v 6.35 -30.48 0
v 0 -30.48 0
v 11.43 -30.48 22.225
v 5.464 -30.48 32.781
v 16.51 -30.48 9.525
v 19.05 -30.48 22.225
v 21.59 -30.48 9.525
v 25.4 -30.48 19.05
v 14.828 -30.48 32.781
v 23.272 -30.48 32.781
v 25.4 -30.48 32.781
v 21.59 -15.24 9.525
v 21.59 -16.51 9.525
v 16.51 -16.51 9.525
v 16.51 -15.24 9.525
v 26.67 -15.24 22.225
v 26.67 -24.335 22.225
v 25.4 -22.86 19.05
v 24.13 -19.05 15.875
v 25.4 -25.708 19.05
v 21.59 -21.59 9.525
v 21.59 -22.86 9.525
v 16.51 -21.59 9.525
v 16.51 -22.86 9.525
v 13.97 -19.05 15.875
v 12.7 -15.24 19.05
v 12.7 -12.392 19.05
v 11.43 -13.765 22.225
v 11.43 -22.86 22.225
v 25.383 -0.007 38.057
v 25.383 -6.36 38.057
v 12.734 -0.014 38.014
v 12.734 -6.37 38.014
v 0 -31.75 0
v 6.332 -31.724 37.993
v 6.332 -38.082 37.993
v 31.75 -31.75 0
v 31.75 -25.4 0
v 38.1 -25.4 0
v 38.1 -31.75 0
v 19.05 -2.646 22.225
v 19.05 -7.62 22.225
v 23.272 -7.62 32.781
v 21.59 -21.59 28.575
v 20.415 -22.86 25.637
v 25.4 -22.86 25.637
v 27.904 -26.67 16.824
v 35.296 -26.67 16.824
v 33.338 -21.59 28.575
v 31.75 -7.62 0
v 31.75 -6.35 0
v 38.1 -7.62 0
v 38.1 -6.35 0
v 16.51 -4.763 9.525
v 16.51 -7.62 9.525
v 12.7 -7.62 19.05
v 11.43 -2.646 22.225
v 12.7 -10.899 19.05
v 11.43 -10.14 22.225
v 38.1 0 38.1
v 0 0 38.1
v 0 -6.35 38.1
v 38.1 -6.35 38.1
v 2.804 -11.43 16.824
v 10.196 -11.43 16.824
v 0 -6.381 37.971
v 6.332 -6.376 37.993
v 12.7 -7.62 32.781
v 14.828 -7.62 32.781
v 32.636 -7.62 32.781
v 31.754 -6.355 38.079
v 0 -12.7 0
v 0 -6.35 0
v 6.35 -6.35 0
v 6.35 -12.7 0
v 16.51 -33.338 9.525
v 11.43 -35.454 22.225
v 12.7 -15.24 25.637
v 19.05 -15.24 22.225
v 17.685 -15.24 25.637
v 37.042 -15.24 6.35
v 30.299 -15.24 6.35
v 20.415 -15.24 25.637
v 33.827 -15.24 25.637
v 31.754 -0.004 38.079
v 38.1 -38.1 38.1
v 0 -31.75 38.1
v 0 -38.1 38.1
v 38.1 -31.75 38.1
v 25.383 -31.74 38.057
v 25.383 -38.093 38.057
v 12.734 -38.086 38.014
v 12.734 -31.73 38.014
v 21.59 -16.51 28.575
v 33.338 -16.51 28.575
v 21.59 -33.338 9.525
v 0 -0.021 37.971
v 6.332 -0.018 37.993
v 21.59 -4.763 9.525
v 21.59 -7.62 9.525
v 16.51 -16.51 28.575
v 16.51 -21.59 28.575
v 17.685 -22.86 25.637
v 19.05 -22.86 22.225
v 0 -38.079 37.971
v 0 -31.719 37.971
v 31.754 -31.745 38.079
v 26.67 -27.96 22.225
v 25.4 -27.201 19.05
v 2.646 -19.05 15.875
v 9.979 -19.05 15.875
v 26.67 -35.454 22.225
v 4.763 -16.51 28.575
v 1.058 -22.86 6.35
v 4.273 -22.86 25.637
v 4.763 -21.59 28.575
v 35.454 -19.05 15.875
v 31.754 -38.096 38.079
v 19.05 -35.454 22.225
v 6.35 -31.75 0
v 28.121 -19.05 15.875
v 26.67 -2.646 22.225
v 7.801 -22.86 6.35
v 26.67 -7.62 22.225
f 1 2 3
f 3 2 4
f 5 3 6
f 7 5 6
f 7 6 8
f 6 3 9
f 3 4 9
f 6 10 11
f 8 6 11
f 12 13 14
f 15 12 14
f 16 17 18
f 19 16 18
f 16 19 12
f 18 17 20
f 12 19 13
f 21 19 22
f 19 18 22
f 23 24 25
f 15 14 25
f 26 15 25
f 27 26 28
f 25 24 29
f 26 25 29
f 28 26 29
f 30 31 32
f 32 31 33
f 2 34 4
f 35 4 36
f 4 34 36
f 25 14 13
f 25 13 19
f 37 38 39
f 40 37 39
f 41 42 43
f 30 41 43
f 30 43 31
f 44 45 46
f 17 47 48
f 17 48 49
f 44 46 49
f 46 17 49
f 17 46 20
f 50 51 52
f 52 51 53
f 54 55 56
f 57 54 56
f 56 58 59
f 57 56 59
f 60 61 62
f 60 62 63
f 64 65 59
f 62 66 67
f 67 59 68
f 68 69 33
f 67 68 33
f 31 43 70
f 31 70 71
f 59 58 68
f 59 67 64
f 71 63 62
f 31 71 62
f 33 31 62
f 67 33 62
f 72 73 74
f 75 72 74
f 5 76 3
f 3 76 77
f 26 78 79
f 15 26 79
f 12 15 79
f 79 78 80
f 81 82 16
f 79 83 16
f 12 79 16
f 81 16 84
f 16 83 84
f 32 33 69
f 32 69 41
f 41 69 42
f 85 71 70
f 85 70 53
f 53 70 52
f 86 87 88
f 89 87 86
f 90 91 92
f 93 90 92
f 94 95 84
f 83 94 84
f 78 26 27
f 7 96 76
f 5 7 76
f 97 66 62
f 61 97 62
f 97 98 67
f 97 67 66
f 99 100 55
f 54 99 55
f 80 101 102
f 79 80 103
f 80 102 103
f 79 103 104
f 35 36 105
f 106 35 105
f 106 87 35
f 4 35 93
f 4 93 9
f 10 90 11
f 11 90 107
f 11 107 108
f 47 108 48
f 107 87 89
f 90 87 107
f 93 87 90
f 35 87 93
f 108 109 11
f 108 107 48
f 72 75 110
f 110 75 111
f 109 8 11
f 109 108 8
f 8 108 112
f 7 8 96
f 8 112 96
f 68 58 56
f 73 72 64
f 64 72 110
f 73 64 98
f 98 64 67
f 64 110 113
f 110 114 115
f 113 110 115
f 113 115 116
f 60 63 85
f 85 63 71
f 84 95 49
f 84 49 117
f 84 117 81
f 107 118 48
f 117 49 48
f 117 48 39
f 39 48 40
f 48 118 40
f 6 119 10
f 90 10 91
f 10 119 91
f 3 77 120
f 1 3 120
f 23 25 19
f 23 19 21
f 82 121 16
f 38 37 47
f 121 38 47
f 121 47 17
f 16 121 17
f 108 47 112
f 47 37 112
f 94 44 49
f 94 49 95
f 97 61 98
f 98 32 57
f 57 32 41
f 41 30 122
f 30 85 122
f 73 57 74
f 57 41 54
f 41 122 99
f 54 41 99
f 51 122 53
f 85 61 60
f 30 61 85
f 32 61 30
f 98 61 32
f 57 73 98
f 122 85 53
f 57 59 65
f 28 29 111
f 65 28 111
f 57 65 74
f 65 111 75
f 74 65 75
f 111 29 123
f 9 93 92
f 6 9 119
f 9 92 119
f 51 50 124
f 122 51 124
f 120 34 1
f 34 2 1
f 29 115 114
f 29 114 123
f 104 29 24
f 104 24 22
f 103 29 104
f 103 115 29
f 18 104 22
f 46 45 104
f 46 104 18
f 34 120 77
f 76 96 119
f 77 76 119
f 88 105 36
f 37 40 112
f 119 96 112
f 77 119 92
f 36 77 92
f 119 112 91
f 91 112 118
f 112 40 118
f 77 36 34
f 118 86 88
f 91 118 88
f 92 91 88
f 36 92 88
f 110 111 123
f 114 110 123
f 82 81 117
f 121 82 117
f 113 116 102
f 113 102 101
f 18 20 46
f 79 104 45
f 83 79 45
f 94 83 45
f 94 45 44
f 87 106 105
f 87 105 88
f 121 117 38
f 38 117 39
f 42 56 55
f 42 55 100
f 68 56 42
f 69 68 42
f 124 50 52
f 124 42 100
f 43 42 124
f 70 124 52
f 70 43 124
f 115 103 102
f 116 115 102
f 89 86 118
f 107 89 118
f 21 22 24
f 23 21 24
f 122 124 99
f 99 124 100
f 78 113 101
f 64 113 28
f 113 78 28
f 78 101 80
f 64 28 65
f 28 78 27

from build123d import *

# Parameters (mm, degrees)
F0_W      = 38.1
F0_H      = 38.1
F1_DEPTH  = 38.1
F6_DEPTH  = 38.1
F9_DEPTH  = 38.1
F10_W     = 25.4
F10_H     = 7.62
F11_DEPTH = 38.1


with BuildPart() as f1:
    # F0 (on Front) → F1 (new body)
    with BuildSketch(Plane.XZ):
        with Locations((19.05, 19.05)):
            Rectangle(F0_W, F0_H)
    extrude(amount=F1_DEPTH)

    # F5 (on offset) → F6 (cut)
    with BuildSketch(Plane.YZ.offset(38.1)):
        Polygon((-6.35, 38.1), (-31.75, 38.1), (-26.67, 16.8241550819), (-21.59, 28.575), (-16.51, 28.575), (-11.43, 16.8241550819), align=None)
        Polygon((-31.75, 0), (-38.1, 38.1), (-38.1, 0), align=None)
        Polygon((-19.05, 15.875), (-25.4, 0), (-22.9262417018, 0), (-19.05, 0), (-12.7, 0), align=None)
        Polygon((0, 0), (0, 38.1), (-6.35, 0), align=None)
    extrude(amount=-F6_DEPTH, mode=Mode.SUBTRACT)

    # F8 (on face) → F9 (cut)
    with BuildSketch(Plane.XZ.offset(38.1)):
        Polygon((0, 37.9714828326), (0, 0), (6.3321403529, 37.9928421172), align=None)
        Polygon((11.43, 22.225), (6.35, 0), (31.75, 0), (26.67, 22.225), (21.59, 9.525), (16.51, 9.525), align=None)
        Polygon((25.382841226, 38.057103065), (12.7342250661, 38.0144373348), (19.05, 22.225), align=None)
        Polygon((31.7535679155, 38.0785925072), (38.1, 0), (38.1, 38.1), align=None)
    extrude(amount=-F9_DEPTH, mode=Mode.SUBTRACT)

    # F10 (on offset) → F11 (cut)
    with BuildSketch(Plane.XY.offset(38.1)):
        with Locations((25.4, -11.43)):
            Rectangle(F10_W, F10_H)
        with Locations((12.7, -26.67)):
            Rectangle(F10_W, F10_H)
    extrude(amount=-F11_DEPTH, mode=Mode.SUBTRACT)


solid = f1.part
